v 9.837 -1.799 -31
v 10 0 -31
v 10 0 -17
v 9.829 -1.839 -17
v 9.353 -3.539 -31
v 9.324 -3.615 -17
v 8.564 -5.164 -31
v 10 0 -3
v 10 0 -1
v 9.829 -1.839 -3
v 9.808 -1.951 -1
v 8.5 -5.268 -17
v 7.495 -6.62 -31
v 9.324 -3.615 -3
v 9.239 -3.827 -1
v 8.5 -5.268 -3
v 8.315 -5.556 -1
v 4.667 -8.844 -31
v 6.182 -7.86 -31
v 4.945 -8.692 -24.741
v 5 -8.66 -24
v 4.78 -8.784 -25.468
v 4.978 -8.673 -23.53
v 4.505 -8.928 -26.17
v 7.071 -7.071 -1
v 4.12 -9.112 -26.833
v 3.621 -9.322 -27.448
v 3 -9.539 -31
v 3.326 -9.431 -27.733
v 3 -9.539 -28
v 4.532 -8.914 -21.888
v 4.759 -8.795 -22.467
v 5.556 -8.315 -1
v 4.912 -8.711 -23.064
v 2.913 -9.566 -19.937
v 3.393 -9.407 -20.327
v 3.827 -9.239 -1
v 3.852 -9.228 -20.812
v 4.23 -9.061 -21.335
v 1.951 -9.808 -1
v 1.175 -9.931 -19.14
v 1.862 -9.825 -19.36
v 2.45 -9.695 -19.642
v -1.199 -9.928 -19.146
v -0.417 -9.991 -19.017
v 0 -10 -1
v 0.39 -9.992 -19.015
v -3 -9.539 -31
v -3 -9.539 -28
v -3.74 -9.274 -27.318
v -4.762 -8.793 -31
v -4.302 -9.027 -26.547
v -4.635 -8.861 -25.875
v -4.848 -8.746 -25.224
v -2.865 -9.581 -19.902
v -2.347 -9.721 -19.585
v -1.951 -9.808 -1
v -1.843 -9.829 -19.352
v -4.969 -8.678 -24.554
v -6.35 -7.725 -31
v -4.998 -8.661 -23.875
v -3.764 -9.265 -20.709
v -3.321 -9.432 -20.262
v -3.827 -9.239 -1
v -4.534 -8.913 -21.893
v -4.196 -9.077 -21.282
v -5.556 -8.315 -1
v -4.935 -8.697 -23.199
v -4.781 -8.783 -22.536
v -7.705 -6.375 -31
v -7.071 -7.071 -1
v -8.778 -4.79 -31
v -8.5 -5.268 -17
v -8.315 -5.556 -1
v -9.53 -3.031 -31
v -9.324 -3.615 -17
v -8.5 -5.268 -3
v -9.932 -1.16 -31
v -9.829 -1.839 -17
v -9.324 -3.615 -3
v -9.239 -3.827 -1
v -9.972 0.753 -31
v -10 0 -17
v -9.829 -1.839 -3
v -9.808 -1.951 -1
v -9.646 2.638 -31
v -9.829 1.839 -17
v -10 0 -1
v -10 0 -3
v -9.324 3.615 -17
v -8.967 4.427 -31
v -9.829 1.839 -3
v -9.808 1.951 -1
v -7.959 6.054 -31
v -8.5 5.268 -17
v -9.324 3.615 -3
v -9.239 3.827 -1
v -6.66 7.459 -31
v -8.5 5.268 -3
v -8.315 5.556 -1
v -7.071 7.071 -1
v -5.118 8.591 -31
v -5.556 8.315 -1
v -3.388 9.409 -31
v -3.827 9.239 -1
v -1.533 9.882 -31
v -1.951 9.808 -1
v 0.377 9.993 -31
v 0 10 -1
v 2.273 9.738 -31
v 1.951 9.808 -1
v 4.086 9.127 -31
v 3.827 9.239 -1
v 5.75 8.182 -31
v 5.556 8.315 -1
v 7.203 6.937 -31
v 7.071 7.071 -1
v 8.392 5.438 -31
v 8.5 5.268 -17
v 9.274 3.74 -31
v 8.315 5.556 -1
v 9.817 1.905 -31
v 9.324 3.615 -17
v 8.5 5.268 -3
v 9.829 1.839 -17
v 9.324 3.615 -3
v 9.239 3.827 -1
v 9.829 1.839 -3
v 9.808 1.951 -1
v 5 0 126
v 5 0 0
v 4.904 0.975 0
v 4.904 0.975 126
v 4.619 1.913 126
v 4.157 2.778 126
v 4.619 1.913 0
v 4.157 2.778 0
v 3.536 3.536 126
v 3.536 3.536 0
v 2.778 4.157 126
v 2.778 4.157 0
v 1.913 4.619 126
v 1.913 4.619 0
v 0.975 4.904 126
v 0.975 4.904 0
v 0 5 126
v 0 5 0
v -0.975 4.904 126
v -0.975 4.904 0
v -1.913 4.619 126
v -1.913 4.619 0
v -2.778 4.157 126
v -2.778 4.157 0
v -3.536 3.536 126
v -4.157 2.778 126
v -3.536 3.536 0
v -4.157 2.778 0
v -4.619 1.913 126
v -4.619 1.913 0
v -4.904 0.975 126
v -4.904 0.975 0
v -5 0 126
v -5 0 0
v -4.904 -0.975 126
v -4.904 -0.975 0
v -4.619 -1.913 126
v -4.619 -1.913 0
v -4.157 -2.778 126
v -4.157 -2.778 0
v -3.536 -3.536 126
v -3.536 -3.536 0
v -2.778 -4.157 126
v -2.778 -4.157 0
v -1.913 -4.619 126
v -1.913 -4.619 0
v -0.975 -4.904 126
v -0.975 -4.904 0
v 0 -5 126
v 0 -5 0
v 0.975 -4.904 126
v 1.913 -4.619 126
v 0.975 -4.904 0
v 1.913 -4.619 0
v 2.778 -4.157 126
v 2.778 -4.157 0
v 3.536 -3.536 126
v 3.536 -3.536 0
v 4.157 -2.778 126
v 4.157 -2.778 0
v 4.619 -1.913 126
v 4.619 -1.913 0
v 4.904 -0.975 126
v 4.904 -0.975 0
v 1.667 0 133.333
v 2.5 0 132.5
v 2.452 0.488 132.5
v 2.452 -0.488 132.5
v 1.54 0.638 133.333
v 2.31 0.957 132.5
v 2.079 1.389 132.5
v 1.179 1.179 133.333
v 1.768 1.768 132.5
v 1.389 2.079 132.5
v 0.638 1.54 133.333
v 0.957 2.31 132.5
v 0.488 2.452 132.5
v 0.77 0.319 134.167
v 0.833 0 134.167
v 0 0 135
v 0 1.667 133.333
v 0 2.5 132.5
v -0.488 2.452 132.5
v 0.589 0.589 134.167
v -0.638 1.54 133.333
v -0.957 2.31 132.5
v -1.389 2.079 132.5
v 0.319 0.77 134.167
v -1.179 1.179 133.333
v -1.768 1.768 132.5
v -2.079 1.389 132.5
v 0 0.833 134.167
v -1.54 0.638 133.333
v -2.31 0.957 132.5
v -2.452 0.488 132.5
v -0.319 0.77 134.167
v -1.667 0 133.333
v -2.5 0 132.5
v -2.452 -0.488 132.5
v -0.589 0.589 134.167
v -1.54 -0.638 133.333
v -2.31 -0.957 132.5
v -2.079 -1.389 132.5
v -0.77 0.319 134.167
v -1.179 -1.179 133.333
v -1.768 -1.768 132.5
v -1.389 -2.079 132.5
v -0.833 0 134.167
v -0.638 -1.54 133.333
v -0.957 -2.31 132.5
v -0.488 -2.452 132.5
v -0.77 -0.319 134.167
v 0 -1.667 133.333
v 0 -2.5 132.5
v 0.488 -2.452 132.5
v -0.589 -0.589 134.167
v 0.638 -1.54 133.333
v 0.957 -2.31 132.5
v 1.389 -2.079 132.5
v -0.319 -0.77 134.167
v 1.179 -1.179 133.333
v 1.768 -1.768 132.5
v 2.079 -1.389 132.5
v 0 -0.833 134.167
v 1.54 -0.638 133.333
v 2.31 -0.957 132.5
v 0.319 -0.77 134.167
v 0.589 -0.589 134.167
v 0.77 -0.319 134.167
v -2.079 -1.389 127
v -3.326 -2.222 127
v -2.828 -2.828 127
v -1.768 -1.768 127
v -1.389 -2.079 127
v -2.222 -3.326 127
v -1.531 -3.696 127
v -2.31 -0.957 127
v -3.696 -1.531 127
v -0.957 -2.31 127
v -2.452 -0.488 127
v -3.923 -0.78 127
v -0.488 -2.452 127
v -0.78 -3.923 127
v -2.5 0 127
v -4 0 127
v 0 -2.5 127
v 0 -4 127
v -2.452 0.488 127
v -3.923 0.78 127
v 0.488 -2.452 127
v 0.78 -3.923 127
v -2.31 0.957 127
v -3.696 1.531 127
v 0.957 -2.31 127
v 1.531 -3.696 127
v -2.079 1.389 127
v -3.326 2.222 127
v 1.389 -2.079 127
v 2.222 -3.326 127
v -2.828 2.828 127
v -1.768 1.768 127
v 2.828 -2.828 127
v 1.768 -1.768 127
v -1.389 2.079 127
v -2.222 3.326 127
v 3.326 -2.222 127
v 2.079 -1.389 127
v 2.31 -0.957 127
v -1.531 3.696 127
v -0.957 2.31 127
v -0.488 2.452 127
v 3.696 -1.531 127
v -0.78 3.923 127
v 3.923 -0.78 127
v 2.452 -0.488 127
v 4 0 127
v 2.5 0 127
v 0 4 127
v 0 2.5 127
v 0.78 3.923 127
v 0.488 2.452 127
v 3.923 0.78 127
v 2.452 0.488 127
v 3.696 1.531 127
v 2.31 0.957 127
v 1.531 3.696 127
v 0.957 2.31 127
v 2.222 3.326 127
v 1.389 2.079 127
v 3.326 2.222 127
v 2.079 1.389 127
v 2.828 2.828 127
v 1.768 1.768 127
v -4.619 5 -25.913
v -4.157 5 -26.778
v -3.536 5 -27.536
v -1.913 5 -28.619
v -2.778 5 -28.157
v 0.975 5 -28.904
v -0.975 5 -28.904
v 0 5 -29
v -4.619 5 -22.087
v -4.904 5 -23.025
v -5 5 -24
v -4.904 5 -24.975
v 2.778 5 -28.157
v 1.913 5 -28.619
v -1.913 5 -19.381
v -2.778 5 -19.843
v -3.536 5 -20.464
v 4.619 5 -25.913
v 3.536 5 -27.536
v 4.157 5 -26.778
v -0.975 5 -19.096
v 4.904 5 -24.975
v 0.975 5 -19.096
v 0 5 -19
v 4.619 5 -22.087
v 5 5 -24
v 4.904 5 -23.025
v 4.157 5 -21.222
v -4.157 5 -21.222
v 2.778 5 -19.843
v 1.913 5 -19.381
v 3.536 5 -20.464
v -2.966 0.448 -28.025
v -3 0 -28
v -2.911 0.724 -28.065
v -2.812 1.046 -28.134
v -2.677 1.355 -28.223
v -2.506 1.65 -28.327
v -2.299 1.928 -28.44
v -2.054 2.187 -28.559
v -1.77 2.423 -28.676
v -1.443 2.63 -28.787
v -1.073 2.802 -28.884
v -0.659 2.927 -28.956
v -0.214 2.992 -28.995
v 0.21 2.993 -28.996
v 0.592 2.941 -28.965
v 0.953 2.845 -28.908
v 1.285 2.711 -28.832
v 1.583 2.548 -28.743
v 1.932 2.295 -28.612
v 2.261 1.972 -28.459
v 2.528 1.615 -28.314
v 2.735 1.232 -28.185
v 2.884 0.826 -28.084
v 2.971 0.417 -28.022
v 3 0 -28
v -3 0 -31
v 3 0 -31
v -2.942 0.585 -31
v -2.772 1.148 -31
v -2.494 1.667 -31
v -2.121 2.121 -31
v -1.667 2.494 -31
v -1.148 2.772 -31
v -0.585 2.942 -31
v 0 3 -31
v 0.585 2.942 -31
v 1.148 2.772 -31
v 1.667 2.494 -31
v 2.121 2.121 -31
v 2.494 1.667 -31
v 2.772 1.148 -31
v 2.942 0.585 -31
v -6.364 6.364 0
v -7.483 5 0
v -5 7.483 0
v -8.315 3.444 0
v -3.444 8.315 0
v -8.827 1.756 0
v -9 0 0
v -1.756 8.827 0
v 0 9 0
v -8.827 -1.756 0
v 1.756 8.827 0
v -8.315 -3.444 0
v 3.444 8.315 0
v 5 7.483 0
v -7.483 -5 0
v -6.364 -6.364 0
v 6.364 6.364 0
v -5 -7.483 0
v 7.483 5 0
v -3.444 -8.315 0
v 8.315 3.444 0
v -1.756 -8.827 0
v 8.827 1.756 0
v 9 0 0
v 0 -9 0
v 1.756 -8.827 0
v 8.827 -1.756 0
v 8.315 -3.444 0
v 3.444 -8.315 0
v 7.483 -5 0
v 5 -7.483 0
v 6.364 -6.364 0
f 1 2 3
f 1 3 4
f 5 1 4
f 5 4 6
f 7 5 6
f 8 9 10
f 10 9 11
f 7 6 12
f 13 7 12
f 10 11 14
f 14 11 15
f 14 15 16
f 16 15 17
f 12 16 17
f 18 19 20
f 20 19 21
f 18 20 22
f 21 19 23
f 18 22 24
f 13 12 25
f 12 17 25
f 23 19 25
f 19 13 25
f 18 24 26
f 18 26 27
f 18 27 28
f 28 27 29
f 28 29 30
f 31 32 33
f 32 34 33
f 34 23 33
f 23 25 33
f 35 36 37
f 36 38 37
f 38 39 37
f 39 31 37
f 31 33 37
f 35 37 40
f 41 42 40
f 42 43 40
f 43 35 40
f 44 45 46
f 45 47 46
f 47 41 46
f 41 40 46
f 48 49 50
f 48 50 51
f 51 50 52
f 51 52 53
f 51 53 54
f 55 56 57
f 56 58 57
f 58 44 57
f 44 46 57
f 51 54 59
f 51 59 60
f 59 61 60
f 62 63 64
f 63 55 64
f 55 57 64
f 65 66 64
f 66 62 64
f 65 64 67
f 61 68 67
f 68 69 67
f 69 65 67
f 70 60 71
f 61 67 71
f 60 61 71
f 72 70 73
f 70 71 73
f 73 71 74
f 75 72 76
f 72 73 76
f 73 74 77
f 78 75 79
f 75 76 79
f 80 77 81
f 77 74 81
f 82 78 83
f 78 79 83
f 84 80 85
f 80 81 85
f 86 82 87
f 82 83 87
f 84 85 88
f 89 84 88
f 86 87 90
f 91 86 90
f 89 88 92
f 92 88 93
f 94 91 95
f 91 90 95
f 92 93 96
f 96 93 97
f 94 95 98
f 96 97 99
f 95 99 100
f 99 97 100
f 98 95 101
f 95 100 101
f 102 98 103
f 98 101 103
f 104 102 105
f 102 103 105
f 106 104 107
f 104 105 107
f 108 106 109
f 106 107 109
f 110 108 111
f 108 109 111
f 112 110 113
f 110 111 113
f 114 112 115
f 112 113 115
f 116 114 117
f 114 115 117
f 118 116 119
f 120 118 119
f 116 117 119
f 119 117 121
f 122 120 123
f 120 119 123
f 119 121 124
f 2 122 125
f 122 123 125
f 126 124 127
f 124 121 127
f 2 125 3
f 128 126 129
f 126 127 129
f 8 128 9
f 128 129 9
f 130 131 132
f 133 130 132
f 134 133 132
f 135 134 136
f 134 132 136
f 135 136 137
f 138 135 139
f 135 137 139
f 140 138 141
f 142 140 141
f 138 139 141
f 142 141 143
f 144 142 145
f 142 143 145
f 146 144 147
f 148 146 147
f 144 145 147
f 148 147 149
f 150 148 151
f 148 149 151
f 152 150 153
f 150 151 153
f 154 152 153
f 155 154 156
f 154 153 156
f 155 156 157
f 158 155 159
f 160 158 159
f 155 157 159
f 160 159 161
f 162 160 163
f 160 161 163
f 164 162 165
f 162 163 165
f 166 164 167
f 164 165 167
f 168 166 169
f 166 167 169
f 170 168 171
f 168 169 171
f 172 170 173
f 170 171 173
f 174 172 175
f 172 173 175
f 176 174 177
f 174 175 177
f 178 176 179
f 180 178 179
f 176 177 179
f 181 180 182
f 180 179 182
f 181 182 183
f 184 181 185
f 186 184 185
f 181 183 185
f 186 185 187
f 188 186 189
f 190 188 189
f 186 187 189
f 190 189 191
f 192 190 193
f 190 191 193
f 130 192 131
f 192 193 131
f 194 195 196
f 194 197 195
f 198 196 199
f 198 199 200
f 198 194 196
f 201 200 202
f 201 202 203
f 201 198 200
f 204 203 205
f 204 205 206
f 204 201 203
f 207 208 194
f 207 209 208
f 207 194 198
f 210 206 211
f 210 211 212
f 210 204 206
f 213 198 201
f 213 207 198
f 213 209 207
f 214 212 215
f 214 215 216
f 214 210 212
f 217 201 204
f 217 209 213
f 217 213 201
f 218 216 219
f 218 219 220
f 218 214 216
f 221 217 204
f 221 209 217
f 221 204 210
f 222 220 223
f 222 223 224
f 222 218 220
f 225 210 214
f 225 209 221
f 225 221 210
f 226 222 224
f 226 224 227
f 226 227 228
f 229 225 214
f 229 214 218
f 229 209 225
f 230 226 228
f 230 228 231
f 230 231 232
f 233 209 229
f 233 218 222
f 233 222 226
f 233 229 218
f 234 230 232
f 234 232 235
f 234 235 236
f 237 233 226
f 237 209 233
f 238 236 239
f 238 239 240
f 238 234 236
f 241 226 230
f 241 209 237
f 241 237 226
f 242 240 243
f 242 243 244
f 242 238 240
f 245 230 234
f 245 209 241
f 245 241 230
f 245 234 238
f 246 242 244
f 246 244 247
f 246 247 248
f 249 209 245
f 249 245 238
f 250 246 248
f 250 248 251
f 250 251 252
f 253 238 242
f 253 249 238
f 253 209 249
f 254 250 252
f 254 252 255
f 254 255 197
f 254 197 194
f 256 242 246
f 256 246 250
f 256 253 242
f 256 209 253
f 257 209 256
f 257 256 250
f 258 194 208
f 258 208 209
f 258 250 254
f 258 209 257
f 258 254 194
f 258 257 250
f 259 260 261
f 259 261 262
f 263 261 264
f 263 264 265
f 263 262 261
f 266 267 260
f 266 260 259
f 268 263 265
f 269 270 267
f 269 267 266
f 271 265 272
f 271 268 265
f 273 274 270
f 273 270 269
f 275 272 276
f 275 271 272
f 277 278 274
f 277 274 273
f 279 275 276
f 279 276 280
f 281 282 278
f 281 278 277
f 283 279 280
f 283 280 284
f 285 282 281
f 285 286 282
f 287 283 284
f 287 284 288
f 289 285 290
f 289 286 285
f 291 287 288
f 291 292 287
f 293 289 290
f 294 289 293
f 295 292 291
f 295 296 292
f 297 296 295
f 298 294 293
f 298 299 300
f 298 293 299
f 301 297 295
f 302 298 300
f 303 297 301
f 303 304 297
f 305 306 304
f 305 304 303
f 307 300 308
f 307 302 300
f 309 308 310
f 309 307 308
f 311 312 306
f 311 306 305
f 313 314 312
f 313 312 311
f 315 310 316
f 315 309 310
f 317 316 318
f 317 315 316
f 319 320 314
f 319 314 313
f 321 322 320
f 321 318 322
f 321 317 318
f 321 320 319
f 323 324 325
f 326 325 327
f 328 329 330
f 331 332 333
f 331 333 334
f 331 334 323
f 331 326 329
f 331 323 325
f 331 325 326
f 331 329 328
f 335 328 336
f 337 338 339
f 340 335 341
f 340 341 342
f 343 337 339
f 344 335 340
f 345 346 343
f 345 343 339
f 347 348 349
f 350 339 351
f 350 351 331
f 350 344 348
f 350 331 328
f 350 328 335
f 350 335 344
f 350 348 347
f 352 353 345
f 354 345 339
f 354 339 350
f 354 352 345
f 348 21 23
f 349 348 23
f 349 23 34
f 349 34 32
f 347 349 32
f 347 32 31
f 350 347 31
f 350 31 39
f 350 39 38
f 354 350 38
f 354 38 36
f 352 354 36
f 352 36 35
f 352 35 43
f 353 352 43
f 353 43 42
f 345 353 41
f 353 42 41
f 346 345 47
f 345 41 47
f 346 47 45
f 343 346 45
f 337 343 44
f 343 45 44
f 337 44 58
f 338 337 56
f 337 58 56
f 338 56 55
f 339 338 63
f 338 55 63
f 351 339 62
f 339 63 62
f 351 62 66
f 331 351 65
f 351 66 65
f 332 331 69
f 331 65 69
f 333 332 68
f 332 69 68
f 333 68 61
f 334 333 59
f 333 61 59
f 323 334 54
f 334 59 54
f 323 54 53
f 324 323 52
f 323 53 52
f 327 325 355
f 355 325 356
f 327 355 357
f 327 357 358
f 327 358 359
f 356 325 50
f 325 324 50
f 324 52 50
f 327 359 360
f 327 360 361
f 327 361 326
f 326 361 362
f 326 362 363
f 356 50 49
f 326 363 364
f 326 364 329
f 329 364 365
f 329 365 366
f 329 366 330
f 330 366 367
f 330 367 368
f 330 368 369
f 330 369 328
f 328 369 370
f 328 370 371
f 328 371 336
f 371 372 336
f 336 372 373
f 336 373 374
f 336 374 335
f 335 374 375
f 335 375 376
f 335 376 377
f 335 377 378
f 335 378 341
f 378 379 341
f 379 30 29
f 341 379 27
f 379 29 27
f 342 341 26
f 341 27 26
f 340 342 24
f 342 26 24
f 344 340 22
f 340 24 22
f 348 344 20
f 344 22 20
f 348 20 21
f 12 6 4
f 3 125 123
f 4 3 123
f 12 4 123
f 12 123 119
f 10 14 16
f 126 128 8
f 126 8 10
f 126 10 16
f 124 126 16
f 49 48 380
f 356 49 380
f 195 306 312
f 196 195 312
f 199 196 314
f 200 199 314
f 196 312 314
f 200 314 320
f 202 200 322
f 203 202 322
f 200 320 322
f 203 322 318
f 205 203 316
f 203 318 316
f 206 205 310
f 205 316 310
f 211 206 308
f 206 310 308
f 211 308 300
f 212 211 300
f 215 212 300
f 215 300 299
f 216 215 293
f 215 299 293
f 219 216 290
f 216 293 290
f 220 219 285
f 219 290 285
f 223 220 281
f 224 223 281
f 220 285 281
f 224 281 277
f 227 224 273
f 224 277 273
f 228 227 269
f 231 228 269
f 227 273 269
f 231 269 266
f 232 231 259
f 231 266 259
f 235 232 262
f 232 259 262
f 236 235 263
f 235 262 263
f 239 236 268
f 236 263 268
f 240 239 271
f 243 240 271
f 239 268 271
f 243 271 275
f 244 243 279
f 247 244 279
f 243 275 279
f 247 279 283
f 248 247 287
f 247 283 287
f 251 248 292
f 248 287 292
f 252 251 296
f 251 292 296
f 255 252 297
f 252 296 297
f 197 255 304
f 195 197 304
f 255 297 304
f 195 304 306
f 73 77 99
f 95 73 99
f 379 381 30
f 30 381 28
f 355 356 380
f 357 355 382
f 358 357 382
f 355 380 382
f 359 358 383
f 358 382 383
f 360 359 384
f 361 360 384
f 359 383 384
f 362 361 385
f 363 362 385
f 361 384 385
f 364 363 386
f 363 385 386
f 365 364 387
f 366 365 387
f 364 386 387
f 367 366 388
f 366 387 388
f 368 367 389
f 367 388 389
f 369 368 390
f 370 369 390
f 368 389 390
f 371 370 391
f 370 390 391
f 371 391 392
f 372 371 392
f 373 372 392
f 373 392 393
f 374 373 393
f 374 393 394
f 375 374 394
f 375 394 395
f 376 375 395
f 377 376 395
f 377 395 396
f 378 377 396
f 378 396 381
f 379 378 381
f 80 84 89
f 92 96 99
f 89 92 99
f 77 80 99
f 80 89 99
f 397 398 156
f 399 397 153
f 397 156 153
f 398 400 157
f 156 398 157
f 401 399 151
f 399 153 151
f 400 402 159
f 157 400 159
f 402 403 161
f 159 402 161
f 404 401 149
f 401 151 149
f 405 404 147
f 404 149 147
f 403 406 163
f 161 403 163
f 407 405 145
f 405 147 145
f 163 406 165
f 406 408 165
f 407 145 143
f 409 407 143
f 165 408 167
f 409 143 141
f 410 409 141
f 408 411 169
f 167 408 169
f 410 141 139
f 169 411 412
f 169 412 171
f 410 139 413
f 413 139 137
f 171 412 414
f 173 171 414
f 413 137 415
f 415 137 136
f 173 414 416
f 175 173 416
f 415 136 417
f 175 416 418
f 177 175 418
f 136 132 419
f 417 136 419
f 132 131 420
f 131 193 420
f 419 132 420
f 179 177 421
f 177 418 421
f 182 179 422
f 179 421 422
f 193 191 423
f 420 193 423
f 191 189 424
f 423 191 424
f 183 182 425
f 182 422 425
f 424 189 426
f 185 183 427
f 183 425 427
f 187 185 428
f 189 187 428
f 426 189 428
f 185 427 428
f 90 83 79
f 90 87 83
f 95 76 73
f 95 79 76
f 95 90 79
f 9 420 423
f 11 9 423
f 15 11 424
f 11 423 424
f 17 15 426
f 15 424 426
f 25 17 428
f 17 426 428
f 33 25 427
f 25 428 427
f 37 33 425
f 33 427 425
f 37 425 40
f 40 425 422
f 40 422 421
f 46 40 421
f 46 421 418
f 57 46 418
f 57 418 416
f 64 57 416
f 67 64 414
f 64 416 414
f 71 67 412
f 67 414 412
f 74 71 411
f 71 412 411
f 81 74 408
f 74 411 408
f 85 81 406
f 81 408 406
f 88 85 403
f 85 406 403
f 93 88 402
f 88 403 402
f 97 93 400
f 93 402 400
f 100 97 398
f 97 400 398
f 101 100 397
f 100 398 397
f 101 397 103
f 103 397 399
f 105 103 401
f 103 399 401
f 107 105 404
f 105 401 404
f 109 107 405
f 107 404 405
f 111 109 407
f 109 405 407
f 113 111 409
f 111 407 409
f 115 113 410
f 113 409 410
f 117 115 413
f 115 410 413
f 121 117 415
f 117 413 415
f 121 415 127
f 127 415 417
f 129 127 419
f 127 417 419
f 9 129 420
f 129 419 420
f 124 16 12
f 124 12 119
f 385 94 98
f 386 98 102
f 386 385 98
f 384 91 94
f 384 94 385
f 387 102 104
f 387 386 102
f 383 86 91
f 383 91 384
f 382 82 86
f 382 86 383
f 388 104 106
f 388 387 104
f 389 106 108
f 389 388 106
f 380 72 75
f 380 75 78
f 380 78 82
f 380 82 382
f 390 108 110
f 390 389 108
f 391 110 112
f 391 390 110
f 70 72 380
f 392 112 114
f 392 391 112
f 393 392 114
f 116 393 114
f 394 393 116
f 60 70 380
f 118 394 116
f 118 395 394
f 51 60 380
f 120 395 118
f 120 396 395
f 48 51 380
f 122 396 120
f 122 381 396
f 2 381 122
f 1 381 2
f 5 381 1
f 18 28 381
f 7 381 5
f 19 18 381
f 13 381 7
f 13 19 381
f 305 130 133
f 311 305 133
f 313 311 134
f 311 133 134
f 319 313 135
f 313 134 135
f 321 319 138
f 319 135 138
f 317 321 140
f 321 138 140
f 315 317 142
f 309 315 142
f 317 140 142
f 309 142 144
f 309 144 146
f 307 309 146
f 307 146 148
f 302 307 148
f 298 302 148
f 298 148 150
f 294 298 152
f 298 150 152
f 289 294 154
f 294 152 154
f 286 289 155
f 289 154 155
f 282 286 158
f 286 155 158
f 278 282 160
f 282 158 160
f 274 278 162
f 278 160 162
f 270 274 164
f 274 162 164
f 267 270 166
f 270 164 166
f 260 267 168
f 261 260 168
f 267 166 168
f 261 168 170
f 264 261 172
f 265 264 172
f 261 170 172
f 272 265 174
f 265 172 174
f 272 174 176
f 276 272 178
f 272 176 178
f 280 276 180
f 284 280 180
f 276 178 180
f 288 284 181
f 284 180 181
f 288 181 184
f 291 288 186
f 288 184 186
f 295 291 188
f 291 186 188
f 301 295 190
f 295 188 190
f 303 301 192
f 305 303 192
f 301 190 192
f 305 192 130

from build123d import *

# Parameters (mm, degrees)
F0_R      = 5
F1_DEPTH  = 127
F2_R      = 2.5
F3_DEPTH  = 8
F4_SIZE   = 2.5
F5_SIZE   = 1
F6_R      = 10
F6_R_2    = 5
F7_DEPTH  = 31
F9_R      = 5
F10_DEPTH = 15
F12_DEPTH = 8
F13_SIZE  = 1
F15_W     = 11.5
F15_H     = 14
F16_DEPTH = 1.5


# Not quite as in the source:
# - a pattern or mirror of a feature is missing from the dataset's text; its kind, count and spacing are read off the source's solid


with BuildPart() as f1:
    # F0 (on Top) → F1 (new body)
    with BuildSketch(Plane.XY):
        Circle(F0_R)
    extrude(amount=F1_DEPTH)

    # F2 (on face) → F3 (join)
    with BuildSketch(Plane.XY.offset(127)):
        Circle(F2_R)
    extrude(amount=F3_DEPTH)

    # F4
    f4_edges = [f1.edges().sort_by_distance(p)[0] for p in [
        (-2.5, 0, 135),
    ]]
    chamfer(f4_edges, length=F4_SIZE)

    # F5
    f5_edges = [f1.edges().sort_by_distance(p)[0] for p in [
        (-5, 0, 127),
    ]]
    chamfer(f5_edges, length=F5_SIZE)

    # F6 (on face) → F7 (join)
    with BuildSketch(Plane(origin=(0, 0, 0), x_dir=(1, 0, 0), z_dir=(0, 0, -1))):
        Circle(F6_R)
        Circle(F6_R_2, mode=Mode.SUBTRACT)
        Circle(F6_R_2)
    extrude(amount=F7_DEPTH)

    # F9 (on offset) → F10 (cut)
    with BuildSketch(Plane.XZ.offset(10)):
        with Locations((0, -24)):
            Circle(F9_R)
    extrude(amount=-F10_DEPTH, mode=Mode.SUBTRACT)

    # F11 (on face) → F12 (cut)
    with BuildSketch(Plane(origin=(0, 0, -31), x_dir=(1, 0, 0), z_dir=(0, 0, -1))):
        with BuildLine():
            Line((-3, 9.5393920142), (-3, 0))
            ThreePointArc((-3, 0), (0, -3), (3, 0))
            Line((3, 0), (3, 9.5393920142))
            ThreePointArc((3, 9.5393920142), (0, 10), (-3, 9.5393920142))
        make_face()
    extrude(amount=-F12_DEPTH, mode=Mode.SUBTRACT)

    # F13
    f13_edges = [f1.edges().sort_by_distance(p)[0] for p in [
        (-10, 0, 0),
    ]]
    chamfer(f13_edges, length=F13_SIZE)

    # F15 (on offset) → F16 (cut)
    with BuildSketch(Plane.YZ.offset(10)):
        with Locations((0, -10)):
            Rectangle(F15_W, F15_H)
    f16 = extrude(amount=-F16_DEPTH, mode=Mode.SUBTRACT)

    # F16_copies: F16 across plane
    add(f16.mirror(Plane(origin=(0, 0, 0), x_dir=(0, 0, -1), z_dir=(-1, 0, 0))), mode=Mode.SUBTRACT)


solid = f1.part
